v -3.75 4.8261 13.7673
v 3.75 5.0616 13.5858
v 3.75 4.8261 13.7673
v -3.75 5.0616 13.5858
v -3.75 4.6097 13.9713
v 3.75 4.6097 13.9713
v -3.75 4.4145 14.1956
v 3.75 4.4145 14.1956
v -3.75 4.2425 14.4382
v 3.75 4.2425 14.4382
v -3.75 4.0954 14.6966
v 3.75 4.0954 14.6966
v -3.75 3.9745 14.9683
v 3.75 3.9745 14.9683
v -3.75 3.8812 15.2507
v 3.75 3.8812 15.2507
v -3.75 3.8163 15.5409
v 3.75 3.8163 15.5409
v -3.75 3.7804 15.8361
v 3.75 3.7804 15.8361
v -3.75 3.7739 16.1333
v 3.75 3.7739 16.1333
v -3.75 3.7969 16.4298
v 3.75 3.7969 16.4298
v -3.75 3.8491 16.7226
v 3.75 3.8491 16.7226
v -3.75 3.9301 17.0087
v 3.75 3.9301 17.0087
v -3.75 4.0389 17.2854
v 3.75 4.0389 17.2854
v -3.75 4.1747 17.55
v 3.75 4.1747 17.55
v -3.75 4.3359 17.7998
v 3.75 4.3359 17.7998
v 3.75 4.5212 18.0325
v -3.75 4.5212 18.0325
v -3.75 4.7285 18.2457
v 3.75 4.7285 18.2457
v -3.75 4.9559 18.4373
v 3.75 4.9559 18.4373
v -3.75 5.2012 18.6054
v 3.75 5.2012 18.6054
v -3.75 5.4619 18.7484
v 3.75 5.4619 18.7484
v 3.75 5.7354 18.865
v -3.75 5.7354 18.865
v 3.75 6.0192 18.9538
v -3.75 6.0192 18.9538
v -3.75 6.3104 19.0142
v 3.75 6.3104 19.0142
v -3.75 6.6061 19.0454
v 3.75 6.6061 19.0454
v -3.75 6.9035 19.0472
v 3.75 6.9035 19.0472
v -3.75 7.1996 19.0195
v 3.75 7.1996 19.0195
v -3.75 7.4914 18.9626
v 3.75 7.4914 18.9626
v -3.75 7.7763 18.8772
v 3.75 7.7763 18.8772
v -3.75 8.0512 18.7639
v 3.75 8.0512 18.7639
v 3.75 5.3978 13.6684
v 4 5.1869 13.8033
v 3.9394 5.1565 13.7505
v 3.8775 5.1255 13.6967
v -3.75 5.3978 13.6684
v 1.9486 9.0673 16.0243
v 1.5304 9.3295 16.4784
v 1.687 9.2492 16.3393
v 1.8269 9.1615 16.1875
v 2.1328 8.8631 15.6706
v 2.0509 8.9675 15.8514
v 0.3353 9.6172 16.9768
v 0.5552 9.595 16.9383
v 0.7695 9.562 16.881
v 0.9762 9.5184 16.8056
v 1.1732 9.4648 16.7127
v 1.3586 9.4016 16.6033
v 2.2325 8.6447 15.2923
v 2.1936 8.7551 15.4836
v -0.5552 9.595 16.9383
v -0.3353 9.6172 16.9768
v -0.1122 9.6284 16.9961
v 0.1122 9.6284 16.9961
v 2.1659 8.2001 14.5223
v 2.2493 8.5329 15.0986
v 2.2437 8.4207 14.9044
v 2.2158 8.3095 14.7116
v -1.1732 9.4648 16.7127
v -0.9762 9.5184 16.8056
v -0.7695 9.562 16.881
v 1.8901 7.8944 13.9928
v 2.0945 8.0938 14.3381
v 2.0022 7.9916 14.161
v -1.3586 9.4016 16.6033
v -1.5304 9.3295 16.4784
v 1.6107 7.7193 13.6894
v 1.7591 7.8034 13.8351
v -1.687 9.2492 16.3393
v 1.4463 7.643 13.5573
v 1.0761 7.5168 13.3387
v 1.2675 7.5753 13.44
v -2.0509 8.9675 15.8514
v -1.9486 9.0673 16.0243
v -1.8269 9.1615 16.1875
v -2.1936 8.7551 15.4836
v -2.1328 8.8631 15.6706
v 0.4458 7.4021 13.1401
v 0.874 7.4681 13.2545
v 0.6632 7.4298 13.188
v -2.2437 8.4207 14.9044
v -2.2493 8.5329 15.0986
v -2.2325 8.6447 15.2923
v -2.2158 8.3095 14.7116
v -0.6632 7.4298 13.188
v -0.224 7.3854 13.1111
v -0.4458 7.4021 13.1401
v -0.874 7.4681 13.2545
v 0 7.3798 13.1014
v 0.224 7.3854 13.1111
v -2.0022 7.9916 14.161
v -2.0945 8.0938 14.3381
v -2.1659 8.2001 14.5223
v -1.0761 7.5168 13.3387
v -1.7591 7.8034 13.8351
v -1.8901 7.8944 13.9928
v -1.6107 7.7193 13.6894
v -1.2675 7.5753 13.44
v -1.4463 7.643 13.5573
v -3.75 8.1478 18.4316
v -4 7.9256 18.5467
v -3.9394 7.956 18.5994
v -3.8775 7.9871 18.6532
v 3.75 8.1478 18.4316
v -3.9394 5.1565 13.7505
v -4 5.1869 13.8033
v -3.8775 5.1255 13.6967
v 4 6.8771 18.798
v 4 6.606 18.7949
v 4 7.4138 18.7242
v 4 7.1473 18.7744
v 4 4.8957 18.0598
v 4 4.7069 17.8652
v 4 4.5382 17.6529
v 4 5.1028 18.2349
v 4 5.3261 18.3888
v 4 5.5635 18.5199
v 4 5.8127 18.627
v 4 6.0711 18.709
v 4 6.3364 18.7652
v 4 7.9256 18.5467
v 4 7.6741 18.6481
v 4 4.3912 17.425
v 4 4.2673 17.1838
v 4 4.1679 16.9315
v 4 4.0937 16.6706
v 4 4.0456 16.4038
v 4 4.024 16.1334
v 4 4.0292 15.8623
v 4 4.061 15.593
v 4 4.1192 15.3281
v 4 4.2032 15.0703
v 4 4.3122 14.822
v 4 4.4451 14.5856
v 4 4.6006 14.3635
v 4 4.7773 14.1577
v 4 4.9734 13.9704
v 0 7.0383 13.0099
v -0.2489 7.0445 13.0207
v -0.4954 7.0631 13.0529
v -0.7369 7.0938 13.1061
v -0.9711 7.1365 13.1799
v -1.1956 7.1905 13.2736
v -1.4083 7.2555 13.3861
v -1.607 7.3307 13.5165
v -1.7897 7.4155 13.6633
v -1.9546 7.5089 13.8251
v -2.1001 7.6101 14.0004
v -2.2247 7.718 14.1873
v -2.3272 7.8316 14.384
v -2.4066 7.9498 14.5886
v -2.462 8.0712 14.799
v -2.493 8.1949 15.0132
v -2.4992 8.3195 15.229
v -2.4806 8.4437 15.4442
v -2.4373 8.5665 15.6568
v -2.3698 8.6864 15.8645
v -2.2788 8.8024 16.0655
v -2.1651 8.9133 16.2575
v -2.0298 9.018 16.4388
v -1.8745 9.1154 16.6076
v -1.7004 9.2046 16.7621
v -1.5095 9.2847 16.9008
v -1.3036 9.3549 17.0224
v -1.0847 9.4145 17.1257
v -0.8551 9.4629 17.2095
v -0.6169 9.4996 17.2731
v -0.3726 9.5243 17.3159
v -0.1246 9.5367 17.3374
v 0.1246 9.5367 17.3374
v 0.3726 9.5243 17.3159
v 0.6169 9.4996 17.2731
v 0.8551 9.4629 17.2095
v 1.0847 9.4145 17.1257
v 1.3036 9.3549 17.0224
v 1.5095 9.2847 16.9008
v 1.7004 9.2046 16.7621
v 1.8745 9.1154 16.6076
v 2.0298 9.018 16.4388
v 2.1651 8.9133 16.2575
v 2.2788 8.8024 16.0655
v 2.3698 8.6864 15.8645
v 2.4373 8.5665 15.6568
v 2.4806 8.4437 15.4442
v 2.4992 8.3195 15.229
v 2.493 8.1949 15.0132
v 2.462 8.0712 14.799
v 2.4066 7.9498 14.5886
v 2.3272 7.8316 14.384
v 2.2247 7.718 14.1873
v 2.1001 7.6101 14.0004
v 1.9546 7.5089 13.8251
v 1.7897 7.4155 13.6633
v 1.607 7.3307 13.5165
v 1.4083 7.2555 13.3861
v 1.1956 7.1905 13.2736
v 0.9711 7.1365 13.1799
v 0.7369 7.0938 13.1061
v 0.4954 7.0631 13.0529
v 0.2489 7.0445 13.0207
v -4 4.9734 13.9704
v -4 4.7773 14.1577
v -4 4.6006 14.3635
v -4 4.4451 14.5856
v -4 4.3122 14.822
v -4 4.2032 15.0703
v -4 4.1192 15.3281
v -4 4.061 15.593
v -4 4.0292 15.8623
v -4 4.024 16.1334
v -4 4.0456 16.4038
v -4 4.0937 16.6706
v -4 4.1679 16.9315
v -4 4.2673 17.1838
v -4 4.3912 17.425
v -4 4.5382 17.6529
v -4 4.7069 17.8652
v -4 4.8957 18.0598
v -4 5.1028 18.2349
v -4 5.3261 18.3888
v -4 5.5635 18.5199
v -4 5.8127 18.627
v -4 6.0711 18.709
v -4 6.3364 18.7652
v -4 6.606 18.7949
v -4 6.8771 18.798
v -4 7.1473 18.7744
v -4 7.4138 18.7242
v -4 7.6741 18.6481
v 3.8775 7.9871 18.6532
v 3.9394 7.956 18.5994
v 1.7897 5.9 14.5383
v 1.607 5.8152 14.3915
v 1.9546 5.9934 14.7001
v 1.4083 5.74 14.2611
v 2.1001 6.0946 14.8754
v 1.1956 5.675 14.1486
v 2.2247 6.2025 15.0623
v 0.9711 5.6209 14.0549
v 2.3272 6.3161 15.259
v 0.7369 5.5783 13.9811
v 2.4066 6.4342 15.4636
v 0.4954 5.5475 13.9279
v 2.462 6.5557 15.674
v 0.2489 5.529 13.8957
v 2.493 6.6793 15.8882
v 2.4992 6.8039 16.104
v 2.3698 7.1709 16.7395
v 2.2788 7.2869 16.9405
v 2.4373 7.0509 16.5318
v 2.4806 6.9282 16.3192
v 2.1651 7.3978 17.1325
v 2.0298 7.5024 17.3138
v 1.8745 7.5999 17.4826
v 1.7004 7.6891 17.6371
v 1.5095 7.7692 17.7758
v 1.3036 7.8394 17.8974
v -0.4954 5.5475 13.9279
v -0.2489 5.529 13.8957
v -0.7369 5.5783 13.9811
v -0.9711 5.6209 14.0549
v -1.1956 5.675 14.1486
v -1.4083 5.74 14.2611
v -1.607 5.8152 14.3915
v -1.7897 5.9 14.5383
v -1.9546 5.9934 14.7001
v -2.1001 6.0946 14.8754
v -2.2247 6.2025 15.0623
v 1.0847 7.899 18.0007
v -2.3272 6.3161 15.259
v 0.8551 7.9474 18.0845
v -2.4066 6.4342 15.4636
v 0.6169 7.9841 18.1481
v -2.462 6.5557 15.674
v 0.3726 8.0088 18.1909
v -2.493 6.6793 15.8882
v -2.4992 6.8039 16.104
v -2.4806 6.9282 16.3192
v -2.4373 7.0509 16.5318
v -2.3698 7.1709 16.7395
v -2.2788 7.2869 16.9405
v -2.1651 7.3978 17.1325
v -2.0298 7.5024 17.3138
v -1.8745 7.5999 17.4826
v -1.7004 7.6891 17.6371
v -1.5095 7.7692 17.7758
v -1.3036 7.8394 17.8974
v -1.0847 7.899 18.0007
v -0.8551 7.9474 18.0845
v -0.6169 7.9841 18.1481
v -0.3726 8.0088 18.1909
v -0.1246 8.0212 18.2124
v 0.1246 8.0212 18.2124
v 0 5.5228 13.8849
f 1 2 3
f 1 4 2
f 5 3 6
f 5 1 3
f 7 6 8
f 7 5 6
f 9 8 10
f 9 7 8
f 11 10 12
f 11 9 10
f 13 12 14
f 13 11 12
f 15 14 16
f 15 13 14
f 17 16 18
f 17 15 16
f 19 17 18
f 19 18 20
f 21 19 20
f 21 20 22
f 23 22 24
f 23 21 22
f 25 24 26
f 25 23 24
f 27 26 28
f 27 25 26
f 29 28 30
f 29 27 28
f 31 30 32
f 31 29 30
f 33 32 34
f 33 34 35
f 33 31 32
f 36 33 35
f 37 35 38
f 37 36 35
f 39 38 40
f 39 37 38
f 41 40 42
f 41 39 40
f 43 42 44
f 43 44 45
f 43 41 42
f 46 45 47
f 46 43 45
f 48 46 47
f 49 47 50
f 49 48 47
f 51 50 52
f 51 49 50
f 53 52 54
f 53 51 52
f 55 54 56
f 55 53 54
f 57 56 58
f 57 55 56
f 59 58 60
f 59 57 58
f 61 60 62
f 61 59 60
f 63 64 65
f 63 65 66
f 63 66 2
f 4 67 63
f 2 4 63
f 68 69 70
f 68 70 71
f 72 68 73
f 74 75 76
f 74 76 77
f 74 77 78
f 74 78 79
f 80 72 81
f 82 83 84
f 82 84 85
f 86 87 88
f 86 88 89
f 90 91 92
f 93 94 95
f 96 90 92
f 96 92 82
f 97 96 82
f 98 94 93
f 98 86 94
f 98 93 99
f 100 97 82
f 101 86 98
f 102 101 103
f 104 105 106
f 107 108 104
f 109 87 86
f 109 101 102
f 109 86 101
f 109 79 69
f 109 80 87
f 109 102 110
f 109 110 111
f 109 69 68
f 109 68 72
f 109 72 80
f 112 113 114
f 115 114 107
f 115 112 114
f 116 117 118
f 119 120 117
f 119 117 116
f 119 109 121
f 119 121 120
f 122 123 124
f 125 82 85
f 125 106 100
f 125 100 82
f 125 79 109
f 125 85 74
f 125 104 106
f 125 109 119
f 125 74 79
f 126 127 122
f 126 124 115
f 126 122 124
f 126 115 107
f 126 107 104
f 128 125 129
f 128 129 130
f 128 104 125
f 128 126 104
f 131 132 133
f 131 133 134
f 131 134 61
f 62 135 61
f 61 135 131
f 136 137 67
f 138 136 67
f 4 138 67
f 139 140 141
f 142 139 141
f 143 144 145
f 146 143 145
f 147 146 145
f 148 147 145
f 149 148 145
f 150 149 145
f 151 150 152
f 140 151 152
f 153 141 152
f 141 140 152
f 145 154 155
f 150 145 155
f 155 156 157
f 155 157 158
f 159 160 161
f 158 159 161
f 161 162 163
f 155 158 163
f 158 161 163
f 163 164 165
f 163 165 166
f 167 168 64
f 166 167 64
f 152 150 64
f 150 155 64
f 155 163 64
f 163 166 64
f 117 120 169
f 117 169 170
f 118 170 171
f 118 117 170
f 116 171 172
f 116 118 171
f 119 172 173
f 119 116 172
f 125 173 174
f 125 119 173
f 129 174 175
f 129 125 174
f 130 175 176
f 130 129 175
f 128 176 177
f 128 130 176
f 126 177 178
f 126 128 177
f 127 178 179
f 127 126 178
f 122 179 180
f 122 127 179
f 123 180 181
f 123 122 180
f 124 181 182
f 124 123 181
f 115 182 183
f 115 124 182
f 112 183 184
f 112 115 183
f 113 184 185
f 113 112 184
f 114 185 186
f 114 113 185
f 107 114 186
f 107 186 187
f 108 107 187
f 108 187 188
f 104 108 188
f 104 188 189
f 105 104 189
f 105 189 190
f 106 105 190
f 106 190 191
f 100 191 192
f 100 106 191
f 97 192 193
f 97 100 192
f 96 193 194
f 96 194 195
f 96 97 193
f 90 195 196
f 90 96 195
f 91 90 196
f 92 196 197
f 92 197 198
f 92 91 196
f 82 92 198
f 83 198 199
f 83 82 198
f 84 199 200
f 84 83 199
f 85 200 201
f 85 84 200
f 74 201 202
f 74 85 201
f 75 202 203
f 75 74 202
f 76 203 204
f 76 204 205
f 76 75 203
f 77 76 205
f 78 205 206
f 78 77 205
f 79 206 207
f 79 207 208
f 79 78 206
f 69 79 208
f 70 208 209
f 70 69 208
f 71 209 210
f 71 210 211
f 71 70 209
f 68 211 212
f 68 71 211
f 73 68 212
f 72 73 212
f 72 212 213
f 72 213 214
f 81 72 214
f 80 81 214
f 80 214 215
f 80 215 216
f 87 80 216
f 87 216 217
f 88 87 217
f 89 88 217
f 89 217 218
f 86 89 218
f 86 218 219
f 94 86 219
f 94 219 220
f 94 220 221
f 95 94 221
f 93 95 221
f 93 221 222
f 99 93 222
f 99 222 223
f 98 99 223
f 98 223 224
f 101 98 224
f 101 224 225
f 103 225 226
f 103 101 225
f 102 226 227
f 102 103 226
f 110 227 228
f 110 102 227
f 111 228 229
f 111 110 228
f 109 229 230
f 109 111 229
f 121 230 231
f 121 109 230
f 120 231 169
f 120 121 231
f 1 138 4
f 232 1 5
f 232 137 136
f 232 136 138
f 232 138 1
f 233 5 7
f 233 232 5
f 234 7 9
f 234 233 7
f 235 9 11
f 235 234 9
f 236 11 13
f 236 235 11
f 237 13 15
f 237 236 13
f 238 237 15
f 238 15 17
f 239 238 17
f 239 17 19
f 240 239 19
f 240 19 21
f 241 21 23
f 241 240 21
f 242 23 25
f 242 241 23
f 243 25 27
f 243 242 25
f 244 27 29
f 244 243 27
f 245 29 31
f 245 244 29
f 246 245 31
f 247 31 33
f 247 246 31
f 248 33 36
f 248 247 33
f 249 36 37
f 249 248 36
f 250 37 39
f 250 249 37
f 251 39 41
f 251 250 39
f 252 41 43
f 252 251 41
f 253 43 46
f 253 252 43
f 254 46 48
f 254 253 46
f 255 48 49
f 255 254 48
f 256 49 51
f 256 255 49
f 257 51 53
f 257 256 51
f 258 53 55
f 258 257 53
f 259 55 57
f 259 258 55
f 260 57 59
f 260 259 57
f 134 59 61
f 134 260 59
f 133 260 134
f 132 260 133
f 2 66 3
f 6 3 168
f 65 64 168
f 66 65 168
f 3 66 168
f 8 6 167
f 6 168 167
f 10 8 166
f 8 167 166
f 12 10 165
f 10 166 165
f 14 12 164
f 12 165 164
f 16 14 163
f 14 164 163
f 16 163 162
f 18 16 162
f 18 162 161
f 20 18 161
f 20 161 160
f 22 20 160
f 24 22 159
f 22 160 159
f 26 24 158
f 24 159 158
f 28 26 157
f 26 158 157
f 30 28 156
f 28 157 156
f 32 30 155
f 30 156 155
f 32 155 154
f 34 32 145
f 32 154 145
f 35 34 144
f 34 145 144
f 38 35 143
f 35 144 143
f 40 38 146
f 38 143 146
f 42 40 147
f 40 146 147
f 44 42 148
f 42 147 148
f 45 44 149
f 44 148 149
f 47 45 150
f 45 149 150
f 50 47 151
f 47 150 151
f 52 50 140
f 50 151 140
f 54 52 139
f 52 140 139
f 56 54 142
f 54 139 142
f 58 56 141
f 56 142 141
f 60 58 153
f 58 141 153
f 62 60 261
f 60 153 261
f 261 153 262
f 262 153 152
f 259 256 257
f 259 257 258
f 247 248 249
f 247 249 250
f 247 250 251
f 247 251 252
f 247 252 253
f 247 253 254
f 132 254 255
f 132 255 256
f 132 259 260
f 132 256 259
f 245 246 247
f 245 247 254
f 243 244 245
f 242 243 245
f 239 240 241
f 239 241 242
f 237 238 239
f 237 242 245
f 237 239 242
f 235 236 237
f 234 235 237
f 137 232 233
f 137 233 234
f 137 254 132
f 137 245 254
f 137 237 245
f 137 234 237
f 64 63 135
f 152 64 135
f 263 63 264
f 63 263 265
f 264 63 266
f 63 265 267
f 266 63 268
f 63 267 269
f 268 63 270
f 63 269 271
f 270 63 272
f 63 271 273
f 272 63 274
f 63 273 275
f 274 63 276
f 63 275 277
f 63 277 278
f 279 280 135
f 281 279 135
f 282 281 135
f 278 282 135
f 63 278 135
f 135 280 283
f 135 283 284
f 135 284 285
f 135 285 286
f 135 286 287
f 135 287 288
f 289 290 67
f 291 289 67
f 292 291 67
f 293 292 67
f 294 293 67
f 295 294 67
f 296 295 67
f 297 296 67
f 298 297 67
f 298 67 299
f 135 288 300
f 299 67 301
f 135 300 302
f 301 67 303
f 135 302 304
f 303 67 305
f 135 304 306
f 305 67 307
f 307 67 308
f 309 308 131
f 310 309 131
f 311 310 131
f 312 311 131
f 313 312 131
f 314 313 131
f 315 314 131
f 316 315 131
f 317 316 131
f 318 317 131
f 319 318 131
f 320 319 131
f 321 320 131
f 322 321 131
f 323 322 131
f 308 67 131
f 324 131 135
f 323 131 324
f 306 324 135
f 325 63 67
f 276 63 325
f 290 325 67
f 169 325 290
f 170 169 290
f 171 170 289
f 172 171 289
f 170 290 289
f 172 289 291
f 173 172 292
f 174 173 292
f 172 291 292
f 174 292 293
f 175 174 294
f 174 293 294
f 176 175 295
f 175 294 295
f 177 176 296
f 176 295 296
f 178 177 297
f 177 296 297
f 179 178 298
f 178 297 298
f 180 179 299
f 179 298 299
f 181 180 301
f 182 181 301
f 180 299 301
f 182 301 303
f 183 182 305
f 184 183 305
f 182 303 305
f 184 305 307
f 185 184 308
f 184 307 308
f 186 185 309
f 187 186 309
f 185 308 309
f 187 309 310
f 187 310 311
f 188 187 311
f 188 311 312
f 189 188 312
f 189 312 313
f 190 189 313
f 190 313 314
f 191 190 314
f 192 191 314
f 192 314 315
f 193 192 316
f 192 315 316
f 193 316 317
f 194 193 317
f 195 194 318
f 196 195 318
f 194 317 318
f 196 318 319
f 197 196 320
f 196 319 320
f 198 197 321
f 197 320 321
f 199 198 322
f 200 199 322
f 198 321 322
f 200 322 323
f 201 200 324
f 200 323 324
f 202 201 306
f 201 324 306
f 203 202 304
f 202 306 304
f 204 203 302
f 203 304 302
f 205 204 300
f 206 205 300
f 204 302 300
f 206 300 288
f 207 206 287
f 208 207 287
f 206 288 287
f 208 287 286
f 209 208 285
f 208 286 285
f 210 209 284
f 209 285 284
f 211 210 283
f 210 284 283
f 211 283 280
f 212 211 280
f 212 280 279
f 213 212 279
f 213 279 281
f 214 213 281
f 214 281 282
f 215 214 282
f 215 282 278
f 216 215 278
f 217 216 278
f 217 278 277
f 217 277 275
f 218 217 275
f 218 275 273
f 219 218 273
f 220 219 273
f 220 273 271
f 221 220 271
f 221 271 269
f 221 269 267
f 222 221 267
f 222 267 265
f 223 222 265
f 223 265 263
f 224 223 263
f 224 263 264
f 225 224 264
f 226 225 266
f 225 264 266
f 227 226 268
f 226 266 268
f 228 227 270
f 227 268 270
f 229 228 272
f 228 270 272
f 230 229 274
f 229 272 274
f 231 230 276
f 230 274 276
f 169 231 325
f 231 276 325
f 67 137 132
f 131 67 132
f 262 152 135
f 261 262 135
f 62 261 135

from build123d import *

# Parameters (mm, degrees)
PAD005_DEPTH            = 4
SKETCH014_R             = 2.5
PAD006_DEPTH            = 2
CHAMFER_SIZE            = 0.25
BODY005_ROLL_ANGLE      = -150
BODY005_PLACEMENT_ANGLE = 180


with BuildPart() as part:
    # Sketch013 → Pad005 (new body, symmetric)
    with BuildSketch(Plane.YZ):
        with BuildLine():
            ThreePointArc((0, 3), (-3, 0), (0, -3))
            Line((0, 3), (0, -3))
        make_face()
    extrude(amount=PAD005_DEPTH, both=True)

    # Sketch014 (on Face2 of Pad005) → Pad006 (join)
    with BuildSketch(Plane.ZX):
        Circle(SKETCH014_R)
    extrude(amount=PAD006_DEPTH)

    # Chamfer
    chamfer_edges = [part.edges().sort_by_distance(p)[0] for p in [
        (0, 2, -2.5),
        (-4, -3, 0),
        (-4, 0, 0),
        (4, -3, 0),
        (4, 0, 0),
        (0, 0, -3),
        (0, 0, 3),
    ]]
    chamfer(chamfer_edges, length=CHAMFER_SIZE)


with BuildPart() as part_1:
    # Body005 roll: moved
    add(part.part.rotate(Axis((0, 0, 0), (1, 0, 0)), BODY005_ROLL_ANGLE))


with BuildPart() as part_2:
    # Body005 placement: moved
    add(part_1.part.moved(Location((0, 6.772758664, 16.05))).rotate(Axis((0, 6.772758664, 16.05), (0, 0, 1)), BODY005_PLACEMENT_ANGLE))


solid = part_2.part
